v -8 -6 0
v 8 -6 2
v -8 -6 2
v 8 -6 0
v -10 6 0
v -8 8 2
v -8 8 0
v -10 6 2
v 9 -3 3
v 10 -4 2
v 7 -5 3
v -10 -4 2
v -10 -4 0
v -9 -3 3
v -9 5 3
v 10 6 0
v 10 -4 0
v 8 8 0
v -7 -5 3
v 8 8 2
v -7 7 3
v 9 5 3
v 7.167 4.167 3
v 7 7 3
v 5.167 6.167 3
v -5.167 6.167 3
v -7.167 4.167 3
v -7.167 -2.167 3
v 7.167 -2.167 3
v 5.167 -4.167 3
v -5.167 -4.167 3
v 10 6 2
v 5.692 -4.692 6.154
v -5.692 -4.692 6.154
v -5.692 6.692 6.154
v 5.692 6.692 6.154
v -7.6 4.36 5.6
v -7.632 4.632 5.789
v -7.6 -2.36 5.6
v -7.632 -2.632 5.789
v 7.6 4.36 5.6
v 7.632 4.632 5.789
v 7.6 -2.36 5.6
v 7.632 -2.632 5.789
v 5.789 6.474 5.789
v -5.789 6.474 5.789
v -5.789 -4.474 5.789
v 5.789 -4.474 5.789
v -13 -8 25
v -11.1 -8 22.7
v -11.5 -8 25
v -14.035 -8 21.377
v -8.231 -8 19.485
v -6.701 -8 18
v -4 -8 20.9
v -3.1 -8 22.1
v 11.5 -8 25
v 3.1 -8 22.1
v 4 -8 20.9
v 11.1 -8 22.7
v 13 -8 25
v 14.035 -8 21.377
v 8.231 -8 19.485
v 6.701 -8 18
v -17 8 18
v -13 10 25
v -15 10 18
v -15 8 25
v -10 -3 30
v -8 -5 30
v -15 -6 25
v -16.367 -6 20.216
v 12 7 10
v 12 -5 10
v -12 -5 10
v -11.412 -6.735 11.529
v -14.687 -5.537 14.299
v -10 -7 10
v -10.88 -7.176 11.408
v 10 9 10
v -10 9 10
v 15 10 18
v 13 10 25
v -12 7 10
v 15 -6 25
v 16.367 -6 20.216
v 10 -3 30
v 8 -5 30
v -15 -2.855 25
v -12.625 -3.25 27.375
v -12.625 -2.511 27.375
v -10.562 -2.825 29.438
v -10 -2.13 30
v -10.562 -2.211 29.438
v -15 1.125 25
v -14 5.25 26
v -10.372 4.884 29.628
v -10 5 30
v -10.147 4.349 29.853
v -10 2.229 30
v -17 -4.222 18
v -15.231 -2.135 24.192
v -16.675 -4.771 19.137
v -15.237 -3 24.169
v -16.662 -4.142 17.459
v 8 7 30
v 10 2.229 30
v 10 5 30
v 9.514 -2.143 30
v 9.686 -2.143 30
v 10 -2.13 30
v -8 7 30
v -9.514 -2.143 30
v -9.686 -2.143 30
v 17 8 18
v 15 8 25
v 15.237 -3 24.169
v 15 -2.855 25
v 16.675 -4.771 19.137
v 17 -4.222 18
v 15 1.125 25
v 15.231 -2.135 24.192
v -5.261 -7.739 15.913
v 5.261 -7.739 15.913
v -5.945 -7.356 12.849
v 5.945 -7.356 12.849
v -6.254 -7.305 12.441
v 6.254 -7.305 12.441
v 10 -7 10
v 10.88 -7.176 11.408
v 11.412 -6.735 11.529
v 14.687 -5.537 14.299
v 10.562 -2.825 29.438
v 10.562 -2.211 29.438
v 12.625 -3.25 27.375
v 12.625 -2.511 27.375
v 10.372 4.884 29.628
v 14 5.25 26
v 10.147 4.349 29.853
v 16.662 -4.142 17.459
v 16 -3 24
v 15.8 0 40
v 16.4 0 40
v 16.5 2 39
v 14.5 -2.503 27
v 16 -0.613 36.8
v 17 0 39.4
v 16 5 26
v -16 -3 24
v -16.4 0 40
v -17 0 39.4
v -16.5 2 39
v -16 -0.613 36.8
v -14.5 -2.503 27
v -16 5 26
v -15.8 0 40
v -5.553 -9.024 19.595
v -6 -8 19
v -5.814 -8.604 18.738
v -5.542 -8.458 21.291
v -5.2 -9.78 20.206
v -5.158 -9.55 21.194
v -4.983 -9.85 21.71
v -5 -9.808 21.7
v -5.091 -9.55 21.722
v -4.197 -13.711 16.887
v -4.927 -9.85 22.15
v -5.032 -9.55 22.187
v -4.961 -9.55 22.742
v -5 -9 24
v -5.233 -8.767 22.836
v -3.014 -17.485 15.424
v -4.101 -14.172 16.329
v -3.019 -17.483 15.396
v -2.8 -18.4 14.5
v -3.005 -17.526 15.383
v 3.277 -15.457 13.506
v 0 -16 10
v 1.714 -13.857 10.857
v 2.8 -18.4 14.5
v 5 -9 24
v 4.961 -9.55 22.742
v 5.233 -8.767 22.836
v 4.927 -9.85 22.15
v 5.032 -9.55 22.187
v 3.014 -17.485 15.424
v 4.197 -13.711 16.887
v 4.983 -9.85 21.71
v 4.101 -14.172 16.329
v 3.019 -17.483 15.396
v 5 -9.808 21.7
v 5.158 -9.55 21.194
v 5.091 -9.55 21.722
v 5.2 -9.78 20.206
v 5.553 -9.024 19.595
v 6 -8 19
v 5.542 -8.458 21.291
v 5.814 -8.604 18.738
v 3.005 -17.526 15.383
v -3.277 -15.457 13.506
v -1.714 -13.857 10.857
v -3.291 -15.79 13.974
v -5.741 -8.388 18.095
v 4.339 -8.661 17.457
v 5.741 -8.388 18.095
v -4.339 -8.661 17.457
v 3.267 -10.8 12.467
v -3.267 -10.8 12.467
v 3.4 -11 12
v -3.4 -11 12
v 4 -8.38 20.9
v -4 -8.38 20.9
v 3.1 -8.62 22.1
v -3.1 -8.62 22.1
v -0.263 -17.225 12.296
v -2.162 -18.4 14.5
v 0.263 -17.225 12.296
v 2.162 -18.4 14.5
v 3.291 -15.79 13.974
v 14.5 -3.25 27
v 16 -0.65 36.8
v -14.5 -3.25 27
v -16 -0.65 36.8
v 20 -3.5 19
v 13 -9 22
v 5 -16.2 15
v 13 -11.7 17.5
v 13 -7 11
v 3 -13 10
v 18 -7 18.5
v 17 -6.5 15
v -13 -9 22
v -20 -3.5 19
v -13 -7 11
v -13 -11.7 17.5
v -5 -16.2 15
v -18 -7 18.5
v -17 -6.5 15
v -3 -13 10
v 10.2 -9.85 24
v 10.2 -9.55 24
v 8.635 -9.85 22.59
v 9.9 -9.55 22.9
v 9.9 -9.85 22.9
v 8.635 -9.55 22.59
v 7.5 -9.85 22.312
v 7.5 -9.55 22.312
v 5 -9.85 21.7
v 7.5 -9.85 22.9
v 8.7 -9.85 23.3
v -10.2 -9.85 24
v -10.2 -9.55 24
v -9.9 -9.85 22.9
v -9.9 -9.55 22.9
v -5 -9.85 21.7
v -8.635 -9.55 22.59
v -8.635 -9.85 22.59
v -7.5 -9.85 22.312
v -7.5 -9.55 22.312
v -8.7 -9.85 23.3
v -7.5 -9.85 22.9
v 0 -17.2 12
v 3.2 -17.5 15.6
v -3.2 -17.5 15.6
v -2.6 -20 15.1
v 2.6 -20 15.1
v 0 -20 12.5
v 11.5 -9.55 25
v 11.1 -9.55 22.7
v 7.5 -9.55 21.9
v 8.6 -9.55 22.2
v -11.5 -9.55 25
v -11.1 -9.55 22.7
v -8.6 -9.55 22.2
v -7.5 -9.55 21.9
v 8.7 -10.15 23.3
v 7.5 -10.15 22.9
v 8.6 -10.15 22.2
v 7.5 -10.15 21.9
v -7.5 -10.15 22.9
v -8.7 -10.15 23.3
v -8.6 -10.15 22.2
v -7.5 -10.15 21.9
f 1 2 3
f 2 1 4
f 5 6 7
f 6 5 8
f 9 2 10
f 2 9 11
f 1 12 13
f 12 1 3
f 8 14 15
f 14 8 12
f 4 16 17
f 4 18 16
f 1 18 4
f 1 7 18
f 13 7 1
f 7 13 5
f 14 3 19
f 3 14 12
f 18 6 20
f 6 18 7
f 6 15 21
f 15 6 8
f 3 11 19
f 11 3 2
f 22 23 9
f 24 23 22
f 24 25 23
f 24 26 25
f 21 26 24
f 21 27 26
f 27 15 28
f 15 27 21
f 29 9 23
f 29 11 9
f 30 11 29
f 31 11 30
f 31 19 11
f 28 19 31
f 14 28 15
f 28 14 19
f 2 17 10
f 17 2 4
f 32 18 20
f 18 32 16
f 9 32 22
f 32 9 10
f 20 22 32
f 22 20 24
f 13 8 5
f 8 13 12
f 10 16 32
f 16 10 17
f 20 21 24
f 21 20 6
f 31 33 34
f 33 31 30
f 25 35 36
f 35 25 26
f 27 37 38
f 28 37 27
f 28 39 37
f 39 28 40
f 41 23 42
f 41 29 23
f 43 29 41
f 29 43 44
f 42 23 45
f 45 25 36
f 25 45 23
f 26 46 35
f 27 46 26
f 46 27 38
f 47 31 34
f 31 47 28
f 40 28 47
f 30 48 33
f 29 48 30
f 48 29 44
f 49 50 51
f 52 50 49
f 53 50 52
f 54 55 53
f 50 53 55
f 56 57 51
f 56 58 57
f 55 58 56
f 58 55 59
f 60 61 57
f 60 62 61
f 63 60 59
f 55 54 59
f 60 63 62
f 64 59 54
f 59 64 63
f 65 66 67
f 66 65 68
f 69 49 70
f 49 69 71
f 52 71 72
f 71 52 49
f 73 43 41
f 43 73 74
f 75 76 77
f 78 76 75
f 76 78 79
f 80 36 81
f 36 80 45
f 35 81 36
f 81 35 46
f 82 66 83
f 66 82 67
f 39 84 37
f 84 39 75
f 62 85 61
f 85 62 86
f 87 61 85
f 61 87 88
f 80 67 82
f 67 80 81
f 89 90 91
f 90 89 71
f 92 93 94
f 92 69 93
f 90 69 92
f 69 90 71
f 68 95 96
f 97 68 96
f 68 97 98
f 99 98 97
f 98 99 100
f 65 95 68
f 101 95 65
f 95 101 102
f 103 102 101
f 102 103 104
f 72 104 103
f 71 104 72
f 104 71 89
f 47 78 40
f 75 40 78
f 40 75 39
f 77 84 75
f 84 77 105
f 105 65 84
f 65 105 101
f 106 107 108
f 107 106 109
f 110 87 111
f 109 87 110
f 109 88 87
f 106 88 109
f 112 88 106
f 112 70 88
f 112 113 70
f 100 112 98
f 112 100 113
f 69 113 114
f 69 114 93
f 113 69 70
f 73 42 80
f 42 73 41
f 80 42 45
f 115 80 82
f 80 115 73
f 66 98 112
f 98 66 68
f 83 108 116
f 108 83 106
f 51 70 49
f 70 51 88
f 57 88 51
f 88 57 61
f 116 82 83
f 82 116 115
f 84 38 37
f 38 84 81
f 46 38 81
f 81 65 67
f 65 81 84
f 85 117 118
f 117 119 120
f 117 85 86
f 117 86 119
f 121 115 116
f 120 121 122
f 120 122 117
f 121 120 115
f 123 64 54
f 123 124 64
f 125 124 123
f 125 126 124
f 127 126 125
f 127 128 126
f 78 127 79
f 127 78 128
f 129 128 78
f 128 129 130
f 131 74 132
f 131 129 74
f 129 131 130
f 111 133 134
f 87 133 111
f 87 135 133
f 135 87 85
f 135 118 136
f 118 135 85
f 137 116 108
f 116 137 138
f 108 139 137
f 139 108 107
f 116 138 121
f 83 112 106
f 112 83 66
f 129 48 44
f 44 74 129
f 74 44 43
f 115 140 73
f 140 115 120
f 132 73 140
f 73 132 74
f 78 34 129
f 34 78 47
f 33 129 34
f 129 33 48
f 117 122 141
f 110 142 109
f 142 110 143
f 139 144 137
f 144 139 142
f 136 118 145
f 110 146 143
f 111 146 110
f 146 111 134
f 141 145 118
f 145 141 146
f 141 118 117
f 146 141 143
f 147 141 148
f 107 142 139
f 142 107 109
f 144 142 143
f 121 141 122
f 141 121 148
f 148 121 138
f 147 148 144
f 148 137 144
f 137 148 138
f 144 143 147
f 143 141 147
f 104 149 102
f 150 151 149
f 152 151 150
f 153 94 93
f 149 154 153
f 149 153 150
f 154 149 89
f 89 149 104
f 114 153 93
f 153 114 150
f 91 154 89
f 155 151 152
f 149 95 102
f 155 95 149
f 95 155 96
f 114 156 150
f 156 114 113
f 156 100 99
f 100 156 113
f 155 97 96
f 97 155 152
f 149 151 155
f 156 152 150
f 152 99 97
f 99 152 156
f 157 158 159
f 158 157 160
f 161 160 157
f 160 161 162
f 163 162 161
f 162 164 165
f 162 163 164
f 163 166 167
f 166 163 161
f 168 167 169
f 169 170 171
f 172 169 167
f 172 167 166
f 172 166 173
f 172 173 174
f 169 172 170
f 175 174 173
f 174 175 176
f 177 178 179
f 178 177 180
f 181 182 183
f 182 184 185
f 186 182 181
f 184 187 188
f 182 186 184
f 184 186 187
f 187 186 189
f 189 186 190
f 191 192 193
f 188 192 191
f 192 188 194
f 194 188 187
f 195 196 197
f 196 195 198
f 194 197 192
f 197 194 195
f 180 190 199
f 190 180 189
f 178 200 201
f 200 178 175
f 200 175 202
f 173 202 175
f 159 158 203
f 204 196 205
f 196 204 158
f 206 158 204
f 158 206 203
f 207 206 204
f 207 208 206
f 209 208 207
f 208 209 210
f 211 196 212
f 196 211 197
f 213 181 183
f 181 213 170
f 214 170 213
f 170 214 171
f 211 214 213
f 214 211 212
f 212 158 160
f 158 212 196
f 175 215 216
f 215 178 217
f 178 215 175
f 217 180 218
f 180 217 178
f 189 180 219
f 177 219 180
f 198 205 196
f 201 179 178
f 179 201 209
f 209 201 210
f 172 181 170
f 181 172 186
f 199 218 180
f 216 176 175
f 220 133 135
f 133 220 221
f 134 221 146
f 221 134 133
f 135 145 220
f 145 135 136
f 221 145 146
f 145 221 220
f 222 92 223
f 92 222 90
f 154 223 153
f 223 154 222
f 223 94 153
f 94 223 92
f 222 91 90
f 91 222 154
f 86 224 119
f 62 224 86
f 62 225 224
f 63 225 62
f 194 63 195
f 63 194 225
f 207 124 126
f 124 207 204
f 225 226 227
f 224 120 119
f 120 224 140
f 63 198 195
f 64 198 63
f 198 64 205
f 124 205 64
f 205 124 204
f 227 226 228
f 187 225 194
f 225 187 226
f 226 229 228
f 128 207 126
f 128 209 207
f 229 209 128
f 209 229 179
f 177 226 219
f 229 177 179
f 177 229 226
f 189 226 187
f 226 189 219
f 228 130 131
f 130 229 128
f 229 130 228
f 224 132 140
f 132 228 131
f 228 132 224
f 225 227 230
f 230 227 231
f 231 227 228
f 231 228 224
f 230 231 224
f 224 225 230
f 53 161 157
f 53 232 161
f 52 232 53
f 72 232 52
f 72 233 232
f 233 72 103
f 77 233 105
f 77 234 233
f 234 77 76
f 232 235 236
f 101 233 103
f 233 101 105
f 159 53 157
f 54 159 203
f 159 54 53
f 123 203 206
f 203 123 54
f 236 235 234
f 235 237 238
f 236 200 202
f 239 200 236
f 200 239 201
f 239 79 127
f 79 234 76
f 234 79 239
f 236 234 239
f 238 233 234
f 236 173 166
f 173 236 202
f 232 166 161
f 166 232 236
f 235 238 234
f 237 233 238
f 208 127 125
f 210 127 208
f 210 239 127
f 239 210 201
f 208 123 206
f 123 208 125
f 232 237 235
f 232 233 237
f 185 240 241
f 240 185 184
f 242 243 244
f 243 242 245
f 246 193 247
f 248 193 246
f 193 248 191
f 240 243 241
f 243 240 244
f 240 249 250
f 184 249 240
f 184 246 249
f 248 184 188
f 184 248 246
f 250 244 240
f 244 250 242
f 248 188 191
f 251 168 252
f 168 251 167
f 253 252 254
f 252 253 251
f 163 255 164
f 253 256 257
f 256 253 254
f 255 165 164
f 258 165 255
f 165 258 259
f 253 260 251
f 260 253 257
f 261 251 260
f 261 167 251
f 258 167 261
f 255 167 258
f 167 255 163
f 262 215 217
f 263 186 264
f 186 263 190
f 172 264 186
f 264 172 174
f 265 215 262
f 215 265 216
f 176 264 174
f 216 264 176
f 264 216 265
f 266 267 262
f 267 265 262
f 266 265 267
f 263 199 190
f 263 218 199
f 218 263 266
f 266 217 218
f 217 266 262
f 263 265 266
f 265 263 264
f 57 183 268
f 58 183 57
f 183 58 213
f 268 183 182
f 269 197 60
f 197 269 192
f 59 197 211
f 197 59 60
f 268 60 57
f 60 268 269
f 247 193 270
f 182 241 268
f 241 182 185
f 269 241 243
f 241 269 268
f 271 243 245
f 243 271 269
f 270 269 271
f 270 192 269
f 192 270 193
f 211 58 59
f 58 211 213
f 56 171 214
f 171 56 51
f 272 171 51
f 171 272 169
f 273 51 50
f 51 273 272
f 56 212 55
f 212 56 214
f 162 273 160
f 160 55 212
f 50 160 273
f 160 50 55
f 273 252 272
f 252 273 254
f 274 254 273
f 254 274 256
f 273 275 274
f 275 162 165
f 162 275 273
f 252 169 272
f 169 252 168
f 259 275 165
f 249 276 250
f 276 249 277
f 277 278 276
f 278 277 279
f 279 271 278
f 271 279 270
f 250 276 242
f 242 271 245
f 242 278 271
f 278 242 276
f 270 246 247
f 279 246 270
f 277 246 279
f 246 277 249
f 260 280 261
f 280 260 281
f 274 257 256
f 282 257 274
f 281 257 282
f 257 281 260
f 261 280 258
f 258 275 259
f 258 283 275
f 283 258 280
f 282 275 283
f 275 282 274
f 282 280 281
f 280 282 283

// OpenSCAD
// Frente = -Y. Unidade: mm. F6 para união, depois exportar STL.
largura = 40;
scale([largura/40,largura/40,largura/40]) union() {
color("#CA1536") polyhedron(points=[[-8.0, -6.0, 0.0], [8.0, -6.0, 0.0], [10.0, -4.0, 0.0], [10.0, 6.0, 0.0], [8.0, 8.0, 0.0], [-8.0, 8.0, 0.0], [-10.0, 6.0, 0.0], [-10.0, -4.0, 0.0], [-8.0, -6.0, 2.0], [8.0, -6.0, 2.0], [10.0, -4.0, 2.0], [10.0, 6.0, 2.0], [8.0, 8.0, 2.0], [-8.0, 8.0, 2.0], [-10.0, 6.0, 2.0], [-10.0, -4.0, 2.0], [-7.0, -5.0, 3.0], [7.0, -5.0, 3.0], [9.0, -3.0, 3.0], [9.0, 5.0, 3.0], [7.0, 7.0, 3.0], [-7.0, 7.0, 3.0], [-9.0, 5.0, 3.0], [-9.0, -3.0, 3.0]], faces=[[0, 7, 8], [8, 7, 15], [14, 7, 6], [15, 7, 14], [9, 1, 0], [0, 8, 9], [16, 17, 9], [9, 8, 16], [6, 7, 3], [3, 1, 2], [0, 1, 3], [3, 5, 6], [3, 7, 0], [4, 5, 3], [21, 22, 13], [13, 22, 14], [13, 14, 6], [6, 5, 13], [10, 3, 2], [11, 3, 10], [18, 19, 10], [10, 19, 11], [2, 1, 10], [1, 9, 10], [10, 9, 17], [17, 18, 10], [23, 21, 20], [20, 19, 23], [23, 17, 16], [23, 18, 17], [23, 22, 21], [23, 19, 18], [23, 8, 15], [16, 8, 23], [15, 14, 23], [14, 22, 23], [20, 21, 12], [21, 13, 12], [12, 5, 4], [12, 13, 5], [12, 19, 20], [11, 19, 12], [4, 3, 12], [12, 3, 11]], convexity=10);
color("#CA1536") polyhedron(points=[[-5.0, -4.0, 2.0], [5.0, -4.0, 2.0], [7.0, -2.0, 2.0], [7.0, 4.0, 2.0], [5.0, 6.0, 2.0], [-5.0, 6.0, 2.0], [-7.0, 4.0, 2.0], [-7.0, -2.0, 2.0], [-6.0, -5.0, 8.0], [6.0, -5.0, 8.0], [8.0, -3.0, 8.0], [8.0, 5.0, 8.0], [6.0, 7.0, 8.0], [-6.0, 7.0, 8.0], [-8.0, 5.0, 8.0], [-8.0, -3.0, 8.0]], faces=[[8, 9, 1], [1, 0, 8], [13, 15, 14], [10, 9, 13], [8, 15, 13], [13, 9, 8], [13, 11, 10], [12, 11, 13], [13, 5, 4], [4, 12, 13], [5, 13, 6], [6, 13, 14], [2, 9, 10], [2, 1, 9], [7, 15, 8], [8, 0, 7], [14, 15, 7], [7, 6, 14], [0, 1, 3], [4, 5, 3], [3, 7, 0], [5, 6, 3], [1, 2, 3], [6, 7, 3], [3, 11, 12], [3, 12, 4], [10, 11, 3], [3, 2, 10]], convexity=10);
color("#CA1536") polyhedron(points=[[-5.0, -4.0, 5.0], [5.0, -4.0, 5.0], [7.0, -2.0, 5.0], [7.0, 4.0, 5.0], [5.0, 6.0, 5.0], [-5.0, 6.0, 5.0], [-7.0, 4.0, 5.0], [-7.0, -2.0, 5.0], [-10.0, -7.0, 10.0], [10.0, -7.0, 10.0], [12.0, -5.0, 10.0], [12.0, 7.0, 10.0], [10.0, 9.0, 10.0], [-10.0, 9.0, 10.0], [-12.0, 7.0, 10.0], [-12.0, -5.0, 10.0], [-15.0, -8.0, 18.0], [15.0, -8.0, 18.0], [17.0, -6.0, 18.0], [17.0, 8.0, 18.0], [15.0, 10.0, 18.0], [-15.0, 10.0, 18.0], [-17.0, 8.0, 18.0], [-17.0, -6.0, 18.0], [-13.0, -8.0, 25.0], [13.0, -8.0, 25.0], [15.0, -6.0, 25.0], [15.0, 8.0, 25.0], [13.0, 10.0, 25.0], [-13.0, 10.0, 25.0], [-15.0, 8.0, 25.0], [-15.0, -6.0, 25.0], [-8.0, -5.0, 30.0], [8.0, -5.0, 30.0], [10.0, -3.0, 30.0], [10.0, 5.0, 30.0], [8.0, 7.0, 30.0], [-8.0, 7.0, 30.0], [-10.0, 5.0, 30.0], [-10.0, -3.0, 30.0]], faces=[[15, 23, 8], [8, 23, 16], [16, 23, 24], [24, 23, 31], [14, 23, 15], [22, 23, 14], [9, 8, 16], [16, 17, 9], [22, 14, 13], [13, 21, 22], [5, 4, 13], [13, 4, 12], [5, 13, 6], [6, 13, 14], [10, 9, 17], [10, 17, 18], [8, 9, 1], [0, 8, 1], [9, 10, 1], [1, 10, 2], [2, 10, 3], [3, 10, 11], [12, 4, 3], [3, 11, 12], [39, 24, 31], [32, 24, 39], [7, 4, 5], [2, 3, 7], [0, 1, 7], [5, 6, 7], [7, 1, 2], [7, 3, 4], [15, 8, 7], [7, 8, 0], [7, 14, 15], [7, 6, 14], [19, 10, 18], [11, 10, 19], [31, 23, 30], [30, 23, 22], [22, 21, 30], [21, 29, 30], [36, 37, 28], [37, 29, 28], [32, 33, 25], [25, 24, 32], [25, 33, 34], [34, 26, 25], [16, 24, 25], [25, 17, 16], [18, 17, 25], [25, 26, 18], [38, 33, 32], [36, 35, 38], [38, 37, 36], [38, 35, 34], [34, 33, 38], [32, 39, 38], [38, 30, 29], [38, 29, 37], [38, 39, 31], [31, 30, 38], [34, 35, 27], [27, 26, 34], [27, 35, 36], [36, 28, 27], [27, 19, 18], [18, 26, 27], [12, 11, 20], [11, 19, 20], [20, 27, 28], [19, 27, 20], [21, 13, 20], [20, 13, 12], [20, 29, 21], [20, 28, 29]], convexity=10);
color("#CA1536") polyhedron(points=[[7.0, -3.0, 26.0], [16.0, -3.0, 24.0], [17.0, 0.0, 39.4], [16.4, 0.0, 40.0], [15.8, 0.0, 40.0], [8.0, 6.0, 26.0], [16.0, 5.0, 26.0], [16.5, 2.0, 39.0]], faces=[[1, 5, 0], [6, 1, 2], [5, 1, 6], [0, 5, 4], [3, 1, 0], [0, 4, 3], [2, 1, 3], [7, 4, 5], [7, 3, 4], [5, 6, 7], [7, 6, 2], [2, 3, 7]], convexity=10);
color("#CA1536") polyhedron(points=[[-7.0, -3.0, 26.0], [-16.0, -3.0, 24.0], [-17.0, 0.0, 39.4], [-16.4, 0.0, 40.0], [-15.8, 0.0, 40.0], [-8.0, 6.0, 26.0], [-16.0, 5.0, 26.0], [-16.5, 2.0, 39.0]], faces=[[0, 5, 1], [2, 1, 6], [6, 1, 5], [4, 5, 0], [0, 1, 3], [3, 4, 0], [3, 1, 2], [5, 4, 7], [4, 3, 7], [7, 6, 5], [2, 6, 7], [7, 3, 2]], convexity=10);
color("#CA1536") polyhedron(points=[[-5.0, -9.0, 24.0], [5.0, -9.0, 24.0], [-6.0, -8.0, 19.0], [6.0, -8.0, 19.0], [-2.8, -18.4, 14.5], [2.8, -18.4, 14.5], [0.0, -16.0, 10.0], [-4.0, -11.0, 12.0], [4.0, -11.0, 12.0]], faces=[[0, 4, 2], [2, 4, 7], [4, 6, 7], [5, 6, 4], [8, 7, 6], [8, 5, 3], [6, 5, 8], [3, 5, 1], [2, 7, 8], [8, 3, 2], [2, 3, 1], [1, 0, 2], [4, 0, 1], [1, 5, 4]], convexity=10);
color("#F4EFE5") polyhedron(points=[[9.5, -3.25, 28.0], [14.5, -3.25, 27.0], [16.0, -0.65, 36.8], [9.5, -2.1, 28.0], [14.5, -2.1, 27.0], [16.0, 0.5, 36.8]], faces=[[0, 2, 1], [5, 3, 4], [3, 5, 2], [3, 2, 0], [2, 5, 4], [4, 1, 2], [4, 3, 0], [0, 1, 4]], convexity=10);
color("#F4EFE5") polyhedron(points=[[-9.5, -3.25, 28.0], [-14.5, -3.25, 27.0], [-16.0, -0.65, 36.8], [-9.5, -2.1, 28.0], [-14.5, -2.1, 27.0], [-16.0, 0.5, 36.8]], faces=[[2, 0, 1], [4, 3, 5], [2, 5, 3], [3, 0, 2], [4, 5, 2], [2, 1, 4], [0, 3, 4], [4, 1, 0]], convexity=10);
color("#F4EFE5") polyhedron(points=[[3.0, -10.0, 19.7], [13.0, -9.0, 22.0], [20.0, -3.5, 19.0], [17.0, -6.5, 15.0], [13.0, -7.0, 11.0], [3.0, -13.0, 10.0], [0.0, -15.0, 12.0], [5.0, -16.2, 15.0], [13.0, -11.7, 17.5], [18.0, -7.0, 18.5], [7.0, -6.0, 13.0]], faces=[[2, 1, 0], [0, 7, 6], [0, 1, 7], [6, 7, 5], [7, 4, 5], [8, 4, 7], [7, 1, 8], [10, 4, 2], [2, 0, 10], [10, 5, 4], [10, 0, 6], [6, 5, 10], [2, 4, 3], [4, 8, 3], [2, 3, 9], [9, 3, 8], [9, 1, 2], [9, 8, 1]], convexity=10);
color("#F4EFE5") polyhedron(points=[[-3.0, -10.0, 19.7], [-13.0, -9.0, 22.0], [-20.0, -3.5, 19.0], [-17.0, -6.5, 15.0], [-13.0, -7.0, 11.0], [-3.0, -13.0, 10.0], [0.0, -15.0, 12.0], [-5.0, -16.2, 15.0], [-13.0, -11.7, 17.5], [-18.0, -7.0, 18.5], [-7.0, -6.0, 13.0]], faces=[[0, 1, 2], [6, 7, 0], [7, 1, 0], [7, 4, 8], [8, 1, 7], [5, 7, 6], [5, 4, 7], [2, 4, 10], [10, 0, 2], [4, 5, 10], [6, 0, 10], [10, 5, 6], [3, 4, 2], [3, 8, 4], [9, 3, 2], [8, 3, 9], [2, 1, 9], [1, 8, 9]], convexity=10);
color("#F4EFE5") polyhedron(points=[[4.5, -9.85, 22.0], [10.2, -9.85, 24.0], [9.9, -9.85, 22.9], [5.0, -9.85, 21.7], [4.5, -9.2, 22.0], [10.2, -9.2, 24.0], [9.9, -9.2, 22.9], [5.0, -9.2, 21.7]], faces=[[0, 4, 5], [5, 1, 0], [0, 1, 2], [2, 3, 0], [1, 5, 2], [2, 5, 6], [7, 4, 0], [0, 3, 7], [7, 5, 4], [6, 5, 7], [3, 2, 7], [7, 2, 6]], convexity=10);
color("#F4EFE5") polyhedron(points=[[-4.5, -9.85, 22.0], [-10.2, -9.85, 24.0], [-9.9, -9.85, 22.9], [-5.0, -9.85, 21.7], [-4.5, -9.2, 22.0], [-10.2, -9.2, 24.0], [-9.9, -9.2, 22.9], [-5.0, -9.2, 21.7]], faces=[[5, 4, 0], [5, 0, 1], [1, 0, 2], [0, 3, 2], [2, 5, 1], [6, 5, 2], [0, 4, 7], [7, 3, 0], [4, 5, 7], [7, 5, 6], [7, 2, 3], [6, 2, 7]], convexity=10);
color("#24252C") polyhedron(points=[[-3.2, -17.5, 15.6], [3.2, -17.5, 15.6], [-2.6, -20.0, 15.1], [2.6, -20.0, 15.1], [0.0, -20.0, 12.5], [0.0, -17.2, 12.0]], faces=[[5, 1, 0], [0, 2, 5], [4, 5, 2], [3, 4, 2], [1, 5, 3], [5, 4, 3], [3, 2, 0], [0, 1, 3]], convexity=10);
color("#24252C") polyhedron(points=[[3.1, -9.55, 22.1], [11.5, -9.55, 25.0], [11.1, -9.55, 22.7], [4.0, -9.55, 20.9], [3.1, -7.1, 22.1], [11.5, -7.1, 25.0], [11.1, -7.1, 22.7], [4.0, -7.1, 20.9]], faces=[[0, 4, 5], [5, 1, 0], [0, 1, 2], [2, 3, 0], [1, 5, 2], [2, 5, 6], [7, 4, 0], [0, 3, 7], [7, 5, 4], [6, 5, 7], [3, 2, 7], [7, 2, 6]], convexity=10);
color("#24252C") polyhedron(points=[[-3.1, -9.55, 22.1], [-11.5, -9.55, 25.0], [-11.1, -9.55, 22.7], [-4.0, -9.55, 20.9], [-3.1, -7.1, 22.1], [-11.5, -7.1, 25.0], [-11.1, -7.1, 22.7], [-4.0, -7.1, 20.9]], faces=[[5, 4, 0], [5, 0, 1], [1, 0, 2], [0, 3, 2], [2, 5, 1], [6, 5, 2], [0, 4, 7], [7, 3, 0], [4, 5, 7], [7, 5, 6], [7, 2, 3], [6, 2, 7]], convexity=10);
color("#24252C") polyhedron(points=[[7.5, -10.15, 22.9], [8.7, -10.15, 23.3], [8.6, -10.15, 22.2], [7.5, -10.15, 21.9], [7.5, -9.3, 22.9], [8.7, -9.3, 23.3], [8.6, -9.3, 22.2], [7.5, -9.3, 21.9]], faces=[[0, 4, 5], [5, 1, 0], [0, 1, 2], [2, 3, 0], [1, 5, 2], [2, 5, 6], [7, 4, 0], [0, 3, 7], [7, 5, 4], [6, 5, 7], [3, 2, 7], [7, 2, 6]], convexity=10);
color("#24252C") polyhedron(points=[[-7.5, -10.15, 22.9], [-8.7, -10.15, 23.3], [-8.6, -10.15, 22.2], [-7.5, -10.15, 21.9], [-7.5, -9.3, 22.9], [-8.7, -9.3, 23.3], [-8.6, -9.3, 22.2], [-7.5, -9.3, 21.9]], faces=[[5, 4, 0], [5, 0, 1], [1, 0, 2], [0, 3, 2], [2, 5, 1], [6, 5, 2], [0, 4, 7], [7, 3, 0], [4, 5, 7], [7, 5, 6], [7, 2, 3], [6, 2, 7]], convexity=10);
}
